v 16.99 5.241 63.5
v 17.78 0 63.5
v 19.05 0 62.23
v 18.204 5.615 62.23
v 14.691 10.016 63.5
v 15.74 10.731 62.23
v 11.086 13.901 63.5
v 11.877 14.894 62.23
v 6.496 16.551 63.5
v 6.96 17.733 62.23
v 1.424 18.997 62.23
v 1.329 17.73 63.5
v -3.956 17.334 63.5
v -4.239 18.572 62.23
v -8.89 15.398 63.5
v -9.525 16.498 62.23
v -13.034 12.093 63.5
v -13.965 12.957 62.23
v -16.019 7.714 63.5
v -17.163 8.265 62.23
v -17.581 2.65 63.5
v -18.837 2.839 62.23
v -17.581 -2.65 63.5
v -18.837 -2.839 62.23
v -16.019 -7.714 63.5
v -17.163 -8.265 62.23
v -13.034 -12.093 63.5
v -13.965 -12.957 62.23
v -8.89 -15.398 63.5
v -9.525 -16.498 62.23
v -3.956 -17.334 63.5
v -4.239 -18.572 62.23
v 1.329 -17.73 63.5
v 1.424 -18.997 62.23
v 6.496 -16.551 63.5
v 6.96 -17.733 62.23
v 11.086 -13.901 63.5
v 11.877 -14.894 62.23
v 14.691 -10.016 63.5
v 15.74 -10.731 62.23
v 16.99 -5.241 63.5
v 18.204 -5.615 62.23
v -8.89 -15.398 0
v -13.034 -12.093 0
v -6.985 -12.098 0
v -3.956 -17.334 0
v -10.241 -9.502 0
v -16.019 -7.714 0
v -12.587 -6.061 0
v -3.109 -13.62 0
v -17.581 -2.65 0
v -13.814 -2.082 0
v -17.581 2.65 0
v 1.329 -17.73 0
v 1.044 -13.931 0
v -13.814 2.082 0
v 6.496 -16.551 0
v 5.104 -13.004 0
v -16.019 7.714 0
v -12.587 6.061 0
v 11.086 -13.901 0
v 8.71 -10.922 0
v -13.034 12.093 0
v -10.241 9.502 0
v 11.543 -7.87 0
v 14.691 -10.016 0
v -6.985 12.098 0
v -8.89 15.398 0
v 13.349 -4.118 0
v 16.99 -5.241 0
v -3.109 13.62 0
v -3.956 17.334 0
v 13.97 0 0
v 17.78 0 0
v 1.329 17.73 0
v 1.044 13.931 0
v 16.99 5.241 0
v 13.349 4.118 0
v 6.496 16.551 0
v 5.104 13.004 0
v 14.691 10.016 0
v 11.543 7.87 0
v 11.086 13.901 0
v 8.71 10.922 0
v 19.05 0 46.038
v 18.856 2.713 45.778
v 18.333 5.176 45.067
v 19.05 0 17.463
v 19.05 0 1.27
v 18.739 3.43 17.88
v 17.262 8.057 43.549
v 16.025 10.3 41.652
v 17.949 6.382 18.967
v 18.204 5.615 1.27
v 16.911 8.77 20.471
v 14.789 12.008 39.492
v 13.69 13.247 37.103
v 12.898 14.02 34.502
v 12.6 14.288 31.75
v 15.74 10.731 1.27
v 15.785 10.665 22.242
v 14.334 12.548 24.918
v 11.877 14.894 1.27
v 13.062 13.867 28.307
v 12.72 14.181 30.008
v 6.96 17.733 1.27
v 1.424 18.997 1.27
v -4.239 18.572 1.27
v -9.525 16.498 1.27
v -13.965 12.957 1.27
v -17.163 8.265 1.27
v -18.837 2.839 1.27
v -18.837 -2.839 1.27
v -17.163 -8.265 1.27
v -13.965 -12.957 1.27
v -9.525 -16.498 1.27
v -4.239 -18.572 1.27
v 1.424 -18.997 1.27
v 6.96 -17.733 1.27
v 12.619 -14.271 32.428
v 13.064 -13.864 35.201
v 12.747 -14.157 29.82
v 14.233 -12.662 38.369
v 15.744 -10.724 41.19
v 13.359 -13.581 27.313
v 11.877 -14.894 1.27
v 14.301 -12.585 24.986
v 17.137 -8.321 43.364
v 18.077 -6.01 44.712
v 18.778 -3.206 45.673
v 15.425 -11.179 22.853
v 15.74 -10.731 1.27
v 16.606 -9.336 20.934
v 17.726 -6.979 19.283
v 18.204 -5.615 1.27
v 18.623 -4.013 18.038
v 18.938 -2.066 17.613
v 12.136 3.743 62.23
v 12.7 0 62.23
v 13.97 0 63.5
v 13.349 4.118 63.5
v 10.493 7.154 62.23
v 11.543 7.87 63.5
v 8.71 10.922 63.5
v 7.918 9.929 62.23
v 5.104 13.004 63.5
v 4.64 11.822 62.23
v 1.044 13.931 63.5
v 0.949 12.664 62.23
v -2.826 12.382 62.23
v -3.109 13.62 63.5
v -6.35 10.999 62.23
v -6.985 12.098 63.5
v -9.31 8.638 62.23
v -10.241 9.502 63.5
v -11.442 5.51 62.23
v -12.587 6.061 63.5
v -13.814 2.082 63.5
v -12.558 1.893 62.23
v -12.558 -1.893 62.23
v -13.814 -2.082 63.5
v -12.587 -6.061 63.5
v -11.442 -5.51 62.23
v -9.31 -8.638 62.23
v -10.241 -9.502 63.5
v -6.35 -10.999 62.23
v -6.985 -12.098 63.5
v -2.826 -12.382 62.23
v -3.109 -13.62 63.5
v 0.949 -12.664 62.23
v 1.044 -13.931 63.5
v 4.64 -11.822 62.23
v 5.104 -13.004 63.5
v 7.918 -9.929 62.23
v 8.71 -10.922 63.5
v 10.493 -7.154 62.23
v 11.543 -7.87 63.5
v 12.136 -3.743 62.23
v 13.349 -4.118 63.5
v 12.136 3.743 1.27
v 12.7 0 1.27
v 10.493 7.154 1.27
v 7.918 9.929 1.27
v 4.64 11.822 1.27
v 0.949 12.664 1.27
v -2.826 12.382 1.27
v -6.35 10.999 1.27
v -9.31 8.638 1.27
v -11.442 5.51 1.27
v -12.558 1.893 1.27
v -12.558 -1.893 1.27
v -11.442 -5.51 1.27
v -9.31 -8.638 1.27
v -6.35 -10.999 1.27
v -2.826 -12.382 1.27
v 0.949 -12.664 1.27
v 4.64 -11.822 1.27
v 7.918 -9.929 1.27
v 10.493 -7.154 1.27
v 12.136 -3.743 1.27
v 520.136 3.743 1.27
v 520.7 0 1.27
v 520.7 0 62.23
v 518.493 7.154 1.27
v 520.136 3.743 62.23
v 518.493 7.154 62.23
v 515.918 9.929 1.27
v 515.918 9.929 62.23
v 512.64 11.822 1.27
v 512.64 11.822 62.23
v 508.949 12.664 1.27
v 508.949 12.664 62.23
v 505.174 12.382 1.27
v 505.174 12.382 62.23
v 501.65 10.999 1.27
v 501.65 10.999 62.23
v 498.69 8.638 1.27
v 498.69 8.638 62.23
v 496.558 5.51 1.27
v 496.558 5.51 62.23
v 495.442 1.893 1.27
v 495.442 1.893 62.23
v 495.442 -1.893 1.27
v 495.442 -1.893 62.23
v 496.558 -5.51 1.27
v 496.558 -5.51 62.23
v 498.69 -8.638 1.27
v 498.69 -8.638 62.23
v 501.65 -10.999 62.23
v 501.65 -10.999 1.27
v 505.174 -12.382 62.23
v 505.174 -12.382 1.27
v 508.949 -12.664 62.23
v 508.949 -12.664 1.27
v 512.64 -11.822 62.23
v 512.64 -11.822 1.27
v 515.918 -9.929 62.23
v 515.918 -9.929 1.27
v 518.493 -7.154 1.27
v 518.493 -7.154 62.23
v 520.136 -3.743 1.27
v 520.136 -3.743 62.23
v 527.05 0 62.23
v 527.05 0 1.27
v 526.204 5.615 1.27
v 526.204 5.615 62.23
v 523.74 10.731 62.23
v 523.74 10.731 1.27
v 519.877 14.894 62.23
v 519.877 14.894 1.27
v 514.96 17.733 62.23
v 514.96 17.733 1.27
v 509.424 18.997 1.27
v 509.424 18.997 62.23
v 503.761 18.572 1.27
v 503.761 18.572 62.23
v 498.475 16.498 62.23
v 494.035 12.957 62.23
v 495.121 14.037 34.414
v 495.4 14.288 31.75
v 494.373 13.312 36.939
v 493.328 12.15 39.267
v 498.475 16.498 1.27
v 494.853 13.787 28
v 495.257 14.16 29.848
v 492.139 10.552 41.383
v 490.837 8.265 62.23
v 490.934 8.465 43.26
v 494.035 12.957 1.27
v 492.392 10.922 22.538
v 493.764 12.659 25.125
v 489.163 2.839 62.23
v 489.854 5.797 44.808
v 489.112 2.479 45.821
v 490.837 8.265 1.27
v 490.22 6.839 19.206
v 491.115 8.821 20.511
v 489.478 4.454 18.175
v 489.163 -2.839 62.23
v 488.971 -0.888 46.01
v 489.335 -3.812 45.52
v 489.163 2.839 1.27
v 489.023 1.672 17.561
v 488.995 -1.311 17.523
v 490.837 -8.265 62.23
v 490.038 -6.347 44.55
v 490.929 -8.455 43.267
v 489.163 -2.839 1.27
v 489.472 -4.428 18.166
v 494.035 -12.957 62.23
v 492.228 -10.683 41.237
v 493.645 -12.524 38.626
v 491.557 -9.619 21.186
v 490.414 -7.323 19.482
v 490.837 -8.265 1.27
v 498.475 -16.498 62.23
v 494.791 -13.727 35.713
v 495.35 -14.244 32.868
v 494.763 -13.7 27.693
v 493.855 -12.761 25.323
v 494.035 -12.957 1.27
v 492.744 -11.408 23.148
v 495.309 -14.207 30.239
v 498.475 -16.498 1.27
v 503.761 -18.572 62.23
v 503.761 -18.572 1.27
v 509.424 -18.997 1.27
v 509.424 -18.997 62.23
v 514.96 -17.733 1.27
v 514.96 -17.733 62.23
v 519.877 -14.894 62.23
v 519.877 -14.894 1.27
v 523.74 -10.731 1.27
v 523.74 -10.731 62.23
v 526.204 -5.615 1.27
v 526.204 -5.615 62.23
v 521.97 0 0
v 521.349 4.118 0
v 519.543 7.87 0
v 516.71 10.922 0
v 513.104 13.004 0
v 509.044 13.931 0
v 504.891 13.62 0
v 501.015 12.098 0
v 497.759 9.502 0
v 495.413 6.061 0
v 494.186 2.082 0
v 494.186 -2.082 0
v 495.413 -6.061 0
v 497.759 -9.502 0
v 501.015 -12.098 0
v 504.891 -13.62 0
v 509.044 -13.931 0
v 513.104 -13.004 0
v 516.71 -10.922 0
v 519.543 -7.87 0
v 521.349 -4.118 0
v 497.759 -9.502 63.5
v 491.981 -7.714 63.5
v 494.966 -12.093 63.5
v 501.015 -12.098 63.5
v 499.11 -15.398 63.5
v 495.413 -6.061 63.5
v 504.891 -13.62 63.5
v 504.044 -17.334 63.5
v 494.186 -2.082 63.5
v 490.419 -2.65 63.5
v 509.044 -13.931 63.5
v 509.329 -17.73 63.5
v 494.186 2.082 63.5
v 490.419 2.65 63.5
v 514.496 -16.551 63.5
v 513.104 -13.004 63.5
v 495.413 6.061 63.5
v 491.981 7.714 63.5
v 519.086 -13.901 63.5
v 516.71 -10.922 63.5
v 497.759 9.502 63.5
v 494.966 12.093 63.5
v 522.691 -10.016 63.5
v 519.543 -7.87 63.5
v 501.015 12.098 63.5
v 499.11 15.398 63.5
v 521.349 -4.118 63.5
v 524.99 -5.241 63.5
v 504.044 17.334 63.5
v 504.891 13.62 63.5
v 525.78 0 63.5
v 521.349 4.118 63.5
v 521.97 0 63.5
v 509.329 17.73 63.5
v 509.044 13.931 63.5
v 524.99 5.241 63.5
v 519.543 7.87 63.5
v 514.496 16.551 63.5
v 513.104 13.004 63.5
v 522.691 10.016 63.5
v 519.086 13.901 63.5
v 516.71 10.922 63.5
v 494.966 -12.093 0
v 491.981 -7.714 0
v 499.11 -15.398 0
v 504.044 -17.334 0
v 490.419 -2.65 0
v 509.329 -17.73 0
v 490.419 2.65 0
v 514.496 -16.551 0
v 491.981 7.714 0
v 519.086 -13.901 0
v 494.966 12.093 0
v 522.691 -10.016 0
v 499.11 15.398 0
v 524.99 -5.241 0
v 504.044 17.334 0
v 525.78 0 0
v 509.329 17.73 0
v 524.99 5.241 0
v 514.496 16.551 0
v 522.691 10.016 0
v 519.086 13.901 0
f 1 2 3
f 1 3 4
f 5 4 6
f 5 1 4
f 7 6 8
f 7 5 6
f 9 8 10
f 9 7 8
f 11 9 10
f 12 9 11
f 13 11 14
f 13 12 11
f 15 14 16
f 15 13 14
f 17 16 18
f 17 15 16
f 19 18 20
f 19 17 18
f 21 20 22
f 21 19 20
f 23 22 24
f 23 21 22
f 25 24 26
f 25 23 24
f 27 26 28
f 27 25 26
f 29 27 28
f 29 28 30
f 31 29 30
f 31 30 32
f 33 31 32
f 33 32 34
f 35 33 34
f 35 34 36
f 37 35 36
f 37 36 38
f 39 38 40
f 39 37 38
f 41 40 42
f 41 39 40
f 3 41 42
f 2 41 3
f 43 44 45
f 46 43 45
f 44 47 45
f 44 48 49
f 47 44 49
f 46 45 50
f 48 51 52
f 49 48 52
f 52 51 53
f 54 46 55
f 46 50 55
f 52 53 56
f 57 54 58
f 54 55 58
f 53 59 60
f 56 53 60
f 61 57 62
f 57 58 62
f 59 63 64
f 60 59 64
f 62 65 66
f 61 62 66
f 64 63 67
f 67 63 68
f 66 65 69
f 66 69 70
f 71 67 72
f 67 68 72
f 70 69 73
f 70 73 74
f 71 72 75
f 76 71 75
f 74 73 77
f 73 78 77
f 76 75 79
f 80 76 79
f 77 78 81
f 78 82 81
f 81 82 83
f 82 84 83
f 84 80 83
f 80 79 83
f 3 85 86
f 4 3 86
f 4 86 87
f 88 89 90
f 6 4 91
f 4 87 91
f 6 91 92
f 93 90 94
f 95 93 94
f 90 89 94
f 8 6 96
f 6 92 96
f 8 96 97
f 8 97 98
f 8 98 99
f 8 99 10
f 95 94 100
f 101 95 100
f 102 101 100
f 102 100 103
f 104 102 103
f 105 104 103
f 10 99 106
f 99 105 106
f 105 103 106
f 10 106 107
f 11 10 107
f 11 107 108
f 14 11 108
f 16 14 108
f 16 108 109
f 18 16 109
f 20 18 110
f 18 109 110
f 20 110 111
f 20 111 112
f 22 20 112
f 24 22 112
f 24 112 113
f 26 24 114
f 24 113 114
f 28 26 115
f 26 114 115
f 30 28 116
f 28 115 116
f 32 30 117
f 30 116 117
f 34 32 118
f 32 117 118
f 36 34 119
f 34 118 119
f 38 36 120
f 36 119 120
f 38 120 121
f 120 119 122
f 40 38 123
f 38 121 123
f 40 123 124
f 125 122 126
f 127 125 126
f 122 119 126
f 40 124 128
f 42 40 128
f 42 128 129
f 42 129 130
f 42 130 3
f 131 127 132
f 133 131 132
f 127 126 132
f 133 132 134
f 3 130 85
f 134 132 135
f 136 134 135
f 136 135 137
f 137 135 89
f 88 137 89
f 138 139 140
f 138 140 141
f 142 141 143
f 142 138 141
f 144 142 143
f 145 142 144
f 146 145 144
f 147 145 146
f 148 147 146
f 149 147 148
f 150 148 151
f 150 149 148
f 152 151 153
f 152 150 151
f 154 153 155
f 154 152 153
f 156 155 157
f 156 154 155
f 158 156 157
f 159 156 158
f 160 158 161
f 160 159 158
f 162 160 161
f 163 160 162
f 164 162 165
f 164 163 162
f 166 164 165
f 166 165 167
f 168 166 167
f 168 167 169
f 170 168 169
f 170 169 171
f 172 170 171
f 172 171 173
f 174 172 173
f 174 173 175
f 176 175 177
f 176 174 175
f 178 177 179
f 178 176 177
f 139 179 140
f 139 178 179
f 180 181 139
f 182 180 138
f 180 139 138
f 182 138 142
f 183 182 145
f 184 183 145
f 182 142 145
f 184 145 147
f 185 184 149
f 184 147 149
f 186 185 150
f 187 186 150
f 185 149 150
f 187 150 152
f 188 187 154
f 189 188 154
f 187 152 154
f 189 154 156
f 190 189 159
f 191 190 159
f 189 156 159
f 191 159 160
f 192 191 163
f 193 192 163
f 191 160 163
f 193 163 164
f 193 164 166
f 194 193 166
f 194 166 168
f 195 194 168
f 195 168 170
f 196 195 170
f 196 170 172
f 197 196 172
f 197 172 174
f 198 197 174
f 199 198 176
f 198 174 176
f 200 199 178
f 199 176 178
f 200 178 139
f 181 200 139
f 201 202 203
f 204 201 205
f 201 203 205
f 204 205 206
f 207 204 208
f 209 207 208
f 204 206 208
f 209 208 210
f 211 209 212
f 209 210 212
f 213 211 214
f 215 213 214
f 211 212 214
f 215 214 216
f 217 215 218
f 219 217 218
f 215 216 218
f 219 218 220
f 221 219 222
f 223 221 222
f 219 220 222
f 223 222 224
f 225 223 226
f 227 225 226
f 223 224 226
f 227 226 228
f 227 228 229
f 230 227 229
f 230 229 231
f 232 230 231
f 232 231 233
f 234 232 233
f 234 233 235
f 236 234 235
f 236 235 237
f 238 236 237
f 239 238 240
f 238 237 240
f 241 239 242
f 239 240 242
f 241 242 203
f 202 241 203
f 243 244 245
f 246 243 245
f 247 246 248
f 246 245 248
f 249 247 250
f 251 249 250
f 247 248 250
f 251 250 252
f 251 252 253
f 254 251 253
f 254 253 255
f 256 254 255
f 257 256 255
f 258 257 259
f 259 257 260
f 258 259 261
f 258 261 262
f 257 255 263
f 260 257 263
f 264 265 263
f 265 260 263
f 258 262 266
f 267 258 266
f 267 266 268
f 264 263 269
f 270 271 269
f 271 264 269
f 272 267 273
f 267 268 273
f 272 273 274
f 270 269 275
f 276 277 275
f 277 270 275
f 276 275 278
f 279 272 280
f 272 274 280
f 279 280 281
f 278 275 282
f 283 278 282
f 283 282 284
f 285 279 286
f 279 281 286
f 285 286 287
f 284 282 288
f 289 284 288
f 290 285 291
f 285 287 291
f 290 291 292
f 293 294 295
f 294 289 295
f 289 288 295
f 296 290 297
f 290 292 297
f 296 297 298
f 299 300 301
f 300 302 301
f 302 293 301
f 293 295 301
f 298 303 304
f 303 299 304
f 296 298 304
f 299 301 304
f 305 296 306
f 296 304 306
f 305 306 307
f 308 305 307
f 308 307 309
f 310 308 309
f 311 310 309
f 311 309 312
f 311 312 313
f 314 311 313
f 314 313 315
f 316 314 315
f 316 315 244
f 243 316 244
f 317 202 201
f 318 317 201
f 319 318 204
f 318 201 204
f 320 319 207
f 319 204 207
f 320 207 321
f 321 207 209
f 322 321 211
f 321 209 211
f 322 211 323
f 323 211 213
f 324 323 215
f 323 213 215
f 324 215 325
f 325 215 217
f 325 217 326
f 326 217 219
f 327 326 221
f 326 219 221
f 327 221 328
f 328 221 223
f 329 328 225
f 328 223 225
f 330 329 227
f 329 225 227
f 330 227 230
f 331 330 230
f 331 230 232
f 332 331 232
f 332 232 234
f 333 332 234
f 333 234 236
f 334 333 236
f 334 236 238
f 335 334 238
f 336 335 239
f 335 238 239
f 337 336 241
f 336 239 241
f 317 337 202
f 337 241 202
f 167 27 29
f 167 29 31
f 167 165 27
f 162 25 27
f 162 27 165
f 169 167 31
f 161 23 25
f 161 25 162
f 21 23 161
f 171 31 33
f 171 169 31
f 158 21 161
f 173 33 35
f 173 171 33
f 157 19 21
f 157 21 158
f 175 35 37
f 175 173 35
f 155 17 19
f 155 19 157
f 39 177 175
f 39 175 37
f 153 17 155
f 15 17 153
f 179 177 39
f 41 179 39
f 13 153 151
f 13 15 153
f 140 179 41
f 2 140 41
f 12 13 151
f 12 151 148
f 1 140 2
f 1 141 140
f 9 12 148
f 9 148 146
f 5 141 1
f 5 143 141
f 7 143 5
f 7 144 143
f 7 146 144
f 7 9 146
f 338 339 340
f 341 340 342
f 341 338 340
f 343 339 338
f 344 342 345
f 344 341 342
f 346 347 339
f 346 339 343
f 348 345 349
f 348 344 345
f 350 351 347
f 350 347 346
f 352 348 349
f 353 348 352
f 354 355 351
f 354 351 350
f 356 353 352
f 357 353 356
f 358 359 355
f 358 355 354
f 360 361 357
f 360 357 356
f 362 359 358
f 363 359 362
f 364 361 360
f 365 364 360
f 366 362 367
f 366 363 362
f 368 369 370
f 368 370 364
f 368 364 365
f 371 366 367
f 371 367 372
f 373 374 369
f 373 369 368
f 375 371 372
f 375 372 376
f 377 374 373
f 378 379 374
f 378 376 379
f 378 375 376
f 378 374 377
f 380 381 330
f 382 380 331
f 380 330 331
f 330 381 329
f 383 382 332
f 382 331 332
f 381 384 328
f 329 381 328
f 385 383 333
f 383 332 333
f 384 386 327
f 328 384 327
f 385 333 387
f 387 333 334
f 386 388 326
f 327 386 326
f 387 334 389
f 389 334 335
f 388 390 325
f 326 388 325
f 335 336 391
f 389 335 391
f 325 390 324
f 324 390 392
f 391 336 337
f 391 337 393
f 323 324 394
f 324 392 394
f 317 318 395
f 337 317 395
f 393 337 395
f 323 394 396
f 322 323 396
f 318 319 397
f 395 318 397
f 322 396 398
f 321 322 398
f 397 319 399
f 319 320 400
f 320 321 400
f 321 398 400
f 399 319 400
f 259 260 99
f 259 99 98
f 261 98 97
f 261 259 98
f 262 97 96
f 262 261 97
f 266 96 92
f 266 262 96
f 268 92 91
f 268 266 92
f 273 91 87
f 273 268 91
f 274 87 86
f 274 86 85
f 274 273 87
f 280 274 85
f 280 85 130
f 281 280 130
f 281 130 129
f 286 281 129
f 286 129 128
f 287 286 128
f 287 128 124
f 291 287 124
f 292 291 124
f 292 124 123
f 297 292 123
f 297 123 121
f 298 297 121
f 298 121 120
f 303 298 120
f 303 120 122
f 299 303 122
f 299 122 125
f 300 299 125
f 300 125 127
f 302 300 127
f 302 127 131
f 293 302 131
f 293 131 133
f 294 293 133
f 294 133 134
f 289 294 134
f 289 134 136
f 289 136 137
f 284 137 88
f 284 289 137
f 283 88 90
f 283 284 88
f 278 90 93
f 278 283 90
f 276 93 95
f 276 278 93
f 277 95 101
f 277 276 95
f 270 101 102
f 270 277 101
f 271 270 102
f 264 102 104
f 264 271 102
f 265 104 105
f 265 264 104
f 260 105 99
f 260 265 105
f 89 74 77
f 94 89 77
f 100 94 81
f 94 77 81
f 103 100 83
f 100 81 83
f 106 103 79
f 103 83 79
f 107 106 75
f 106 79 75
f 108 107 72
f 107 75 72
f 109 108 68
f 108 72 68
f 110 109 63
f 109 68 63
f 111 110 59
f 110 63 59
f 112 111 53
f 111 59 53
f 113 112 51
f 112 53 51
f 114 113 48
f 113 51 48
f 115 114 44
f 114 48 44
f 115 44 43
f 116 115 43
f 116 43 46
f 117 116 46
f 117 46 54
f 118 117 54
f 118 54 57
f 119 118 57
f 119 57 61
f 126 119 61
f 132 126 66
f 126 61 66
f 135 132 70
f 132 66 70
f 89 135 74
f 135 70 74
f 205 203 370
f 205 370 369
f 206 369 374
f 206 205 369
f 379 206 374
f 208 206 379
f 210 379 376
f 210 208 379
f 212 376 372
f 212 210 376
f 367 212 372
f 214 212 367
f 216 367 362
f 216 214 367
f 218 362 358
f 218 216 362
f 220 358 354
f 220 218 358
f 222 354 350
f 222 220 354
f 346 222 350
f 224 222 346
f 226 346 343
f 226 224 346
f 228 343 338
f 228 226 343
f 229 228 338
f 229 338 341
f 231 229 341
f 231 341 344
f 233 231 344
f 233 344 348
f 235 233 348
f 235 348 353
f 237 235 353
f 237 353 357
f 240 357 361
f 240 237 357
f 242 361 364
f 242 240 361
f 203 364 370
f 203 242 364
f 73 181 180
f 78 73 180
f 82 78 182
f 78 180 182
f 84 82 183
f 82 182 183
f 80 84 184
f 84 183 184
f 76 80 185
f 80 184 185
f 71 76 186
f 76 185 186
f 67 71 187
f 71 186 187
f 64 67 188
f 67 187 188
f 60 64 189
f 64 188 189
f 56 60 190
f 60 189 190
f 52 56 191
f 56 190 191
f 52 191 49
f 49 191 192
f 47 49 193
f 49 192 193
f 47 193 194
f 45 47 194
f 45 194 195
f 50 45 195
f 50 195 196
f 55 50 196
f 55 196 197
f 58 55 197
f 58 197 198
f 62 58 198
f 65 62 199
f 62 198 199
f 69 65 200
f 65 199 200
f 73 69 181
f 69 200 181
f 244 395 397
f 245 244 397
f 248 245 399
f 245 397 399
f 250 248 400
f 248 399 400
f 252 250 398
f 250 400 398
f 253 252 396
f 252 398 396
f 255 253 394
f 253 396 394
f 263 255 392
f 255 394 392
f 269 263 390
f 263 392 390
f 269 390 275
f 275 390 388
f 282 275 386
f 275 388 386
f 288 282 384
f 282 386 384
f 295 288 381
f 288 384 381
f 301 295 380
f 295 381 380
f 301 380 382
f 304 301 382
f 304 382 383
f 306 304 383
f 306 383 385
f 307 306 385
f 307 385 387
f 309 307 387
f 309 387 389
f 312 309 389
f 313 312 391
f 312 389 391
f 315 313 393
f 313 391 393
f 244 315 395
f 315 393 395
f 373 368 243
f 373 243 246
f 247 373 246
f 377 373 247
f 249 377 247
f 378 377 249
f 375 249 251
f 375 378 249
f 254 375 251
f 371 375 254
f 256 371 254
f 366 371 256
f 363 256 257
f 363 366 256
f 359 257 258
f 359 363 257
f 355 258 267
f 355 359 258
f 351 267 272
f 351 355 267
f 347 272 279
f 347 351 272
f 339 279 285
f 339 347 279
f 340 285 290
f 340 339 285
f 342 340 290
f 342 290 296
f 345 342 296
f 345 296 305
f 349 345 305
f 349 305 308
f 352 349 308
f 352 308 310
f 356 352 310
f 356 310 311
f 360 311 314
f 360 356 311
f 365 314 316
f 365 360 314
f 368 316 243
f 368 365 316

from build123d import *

# Parameters (mm, degrees)
F0_R     = 19.05
F1_DEPTH = 63.5
F3_R     = 14.2875
F5_R     = 12.7
F6_DEPTH = 63.5
F7_SIZE  = 1.27


with BuildPart() as f1:
    # F0 (on Top) → F1 (new body)
    with BuildSketch(Plane.XY):
        Circle(F0_R)
        with Locations((508, 0)):
            Circle(F0_R)
    extrude(amount=F1_DEPTH)

    # F4: sweep along a path in F2
    with BuildLine(Plane.XZ) as f4_path:
        Line((0, 31.75), (508, 31.75))
    # F3 (on Right) → F4 (sweep)
    with BuildSketch(Plane.YZ):
        with Locations((0, 31.75)):
            Circle(F3_R)
    sweep(path=f4_path.line)

    # F5 (on face) → F6 (cut)
    with BuildSketch(Plane.XY.offset(63.5)):
        Circle(F5_R)
        with Locations((508, 0)):
            Circle(F5_R)
    extrude(amount=-F6_DEPTH, mode=Mode.SUBTRACT)

    # F7
    f7_edges = [f1.edges().sort_by_distance(p)[0] for p in [
        (-19.05, 0, 63.5),
        (-12.7, 0, 63.5),
        (-19.05, 0, 0),
        (-12.7, 0, 0),
        (488.95, 0, 0),
        (495.3, 0, 0),
        (495.3, 0, 63.5),
        (488.95, 0, 63.5),
    ]]
    chamfer(f7_edges, length=F7_SIZE)


solid = f1.part
